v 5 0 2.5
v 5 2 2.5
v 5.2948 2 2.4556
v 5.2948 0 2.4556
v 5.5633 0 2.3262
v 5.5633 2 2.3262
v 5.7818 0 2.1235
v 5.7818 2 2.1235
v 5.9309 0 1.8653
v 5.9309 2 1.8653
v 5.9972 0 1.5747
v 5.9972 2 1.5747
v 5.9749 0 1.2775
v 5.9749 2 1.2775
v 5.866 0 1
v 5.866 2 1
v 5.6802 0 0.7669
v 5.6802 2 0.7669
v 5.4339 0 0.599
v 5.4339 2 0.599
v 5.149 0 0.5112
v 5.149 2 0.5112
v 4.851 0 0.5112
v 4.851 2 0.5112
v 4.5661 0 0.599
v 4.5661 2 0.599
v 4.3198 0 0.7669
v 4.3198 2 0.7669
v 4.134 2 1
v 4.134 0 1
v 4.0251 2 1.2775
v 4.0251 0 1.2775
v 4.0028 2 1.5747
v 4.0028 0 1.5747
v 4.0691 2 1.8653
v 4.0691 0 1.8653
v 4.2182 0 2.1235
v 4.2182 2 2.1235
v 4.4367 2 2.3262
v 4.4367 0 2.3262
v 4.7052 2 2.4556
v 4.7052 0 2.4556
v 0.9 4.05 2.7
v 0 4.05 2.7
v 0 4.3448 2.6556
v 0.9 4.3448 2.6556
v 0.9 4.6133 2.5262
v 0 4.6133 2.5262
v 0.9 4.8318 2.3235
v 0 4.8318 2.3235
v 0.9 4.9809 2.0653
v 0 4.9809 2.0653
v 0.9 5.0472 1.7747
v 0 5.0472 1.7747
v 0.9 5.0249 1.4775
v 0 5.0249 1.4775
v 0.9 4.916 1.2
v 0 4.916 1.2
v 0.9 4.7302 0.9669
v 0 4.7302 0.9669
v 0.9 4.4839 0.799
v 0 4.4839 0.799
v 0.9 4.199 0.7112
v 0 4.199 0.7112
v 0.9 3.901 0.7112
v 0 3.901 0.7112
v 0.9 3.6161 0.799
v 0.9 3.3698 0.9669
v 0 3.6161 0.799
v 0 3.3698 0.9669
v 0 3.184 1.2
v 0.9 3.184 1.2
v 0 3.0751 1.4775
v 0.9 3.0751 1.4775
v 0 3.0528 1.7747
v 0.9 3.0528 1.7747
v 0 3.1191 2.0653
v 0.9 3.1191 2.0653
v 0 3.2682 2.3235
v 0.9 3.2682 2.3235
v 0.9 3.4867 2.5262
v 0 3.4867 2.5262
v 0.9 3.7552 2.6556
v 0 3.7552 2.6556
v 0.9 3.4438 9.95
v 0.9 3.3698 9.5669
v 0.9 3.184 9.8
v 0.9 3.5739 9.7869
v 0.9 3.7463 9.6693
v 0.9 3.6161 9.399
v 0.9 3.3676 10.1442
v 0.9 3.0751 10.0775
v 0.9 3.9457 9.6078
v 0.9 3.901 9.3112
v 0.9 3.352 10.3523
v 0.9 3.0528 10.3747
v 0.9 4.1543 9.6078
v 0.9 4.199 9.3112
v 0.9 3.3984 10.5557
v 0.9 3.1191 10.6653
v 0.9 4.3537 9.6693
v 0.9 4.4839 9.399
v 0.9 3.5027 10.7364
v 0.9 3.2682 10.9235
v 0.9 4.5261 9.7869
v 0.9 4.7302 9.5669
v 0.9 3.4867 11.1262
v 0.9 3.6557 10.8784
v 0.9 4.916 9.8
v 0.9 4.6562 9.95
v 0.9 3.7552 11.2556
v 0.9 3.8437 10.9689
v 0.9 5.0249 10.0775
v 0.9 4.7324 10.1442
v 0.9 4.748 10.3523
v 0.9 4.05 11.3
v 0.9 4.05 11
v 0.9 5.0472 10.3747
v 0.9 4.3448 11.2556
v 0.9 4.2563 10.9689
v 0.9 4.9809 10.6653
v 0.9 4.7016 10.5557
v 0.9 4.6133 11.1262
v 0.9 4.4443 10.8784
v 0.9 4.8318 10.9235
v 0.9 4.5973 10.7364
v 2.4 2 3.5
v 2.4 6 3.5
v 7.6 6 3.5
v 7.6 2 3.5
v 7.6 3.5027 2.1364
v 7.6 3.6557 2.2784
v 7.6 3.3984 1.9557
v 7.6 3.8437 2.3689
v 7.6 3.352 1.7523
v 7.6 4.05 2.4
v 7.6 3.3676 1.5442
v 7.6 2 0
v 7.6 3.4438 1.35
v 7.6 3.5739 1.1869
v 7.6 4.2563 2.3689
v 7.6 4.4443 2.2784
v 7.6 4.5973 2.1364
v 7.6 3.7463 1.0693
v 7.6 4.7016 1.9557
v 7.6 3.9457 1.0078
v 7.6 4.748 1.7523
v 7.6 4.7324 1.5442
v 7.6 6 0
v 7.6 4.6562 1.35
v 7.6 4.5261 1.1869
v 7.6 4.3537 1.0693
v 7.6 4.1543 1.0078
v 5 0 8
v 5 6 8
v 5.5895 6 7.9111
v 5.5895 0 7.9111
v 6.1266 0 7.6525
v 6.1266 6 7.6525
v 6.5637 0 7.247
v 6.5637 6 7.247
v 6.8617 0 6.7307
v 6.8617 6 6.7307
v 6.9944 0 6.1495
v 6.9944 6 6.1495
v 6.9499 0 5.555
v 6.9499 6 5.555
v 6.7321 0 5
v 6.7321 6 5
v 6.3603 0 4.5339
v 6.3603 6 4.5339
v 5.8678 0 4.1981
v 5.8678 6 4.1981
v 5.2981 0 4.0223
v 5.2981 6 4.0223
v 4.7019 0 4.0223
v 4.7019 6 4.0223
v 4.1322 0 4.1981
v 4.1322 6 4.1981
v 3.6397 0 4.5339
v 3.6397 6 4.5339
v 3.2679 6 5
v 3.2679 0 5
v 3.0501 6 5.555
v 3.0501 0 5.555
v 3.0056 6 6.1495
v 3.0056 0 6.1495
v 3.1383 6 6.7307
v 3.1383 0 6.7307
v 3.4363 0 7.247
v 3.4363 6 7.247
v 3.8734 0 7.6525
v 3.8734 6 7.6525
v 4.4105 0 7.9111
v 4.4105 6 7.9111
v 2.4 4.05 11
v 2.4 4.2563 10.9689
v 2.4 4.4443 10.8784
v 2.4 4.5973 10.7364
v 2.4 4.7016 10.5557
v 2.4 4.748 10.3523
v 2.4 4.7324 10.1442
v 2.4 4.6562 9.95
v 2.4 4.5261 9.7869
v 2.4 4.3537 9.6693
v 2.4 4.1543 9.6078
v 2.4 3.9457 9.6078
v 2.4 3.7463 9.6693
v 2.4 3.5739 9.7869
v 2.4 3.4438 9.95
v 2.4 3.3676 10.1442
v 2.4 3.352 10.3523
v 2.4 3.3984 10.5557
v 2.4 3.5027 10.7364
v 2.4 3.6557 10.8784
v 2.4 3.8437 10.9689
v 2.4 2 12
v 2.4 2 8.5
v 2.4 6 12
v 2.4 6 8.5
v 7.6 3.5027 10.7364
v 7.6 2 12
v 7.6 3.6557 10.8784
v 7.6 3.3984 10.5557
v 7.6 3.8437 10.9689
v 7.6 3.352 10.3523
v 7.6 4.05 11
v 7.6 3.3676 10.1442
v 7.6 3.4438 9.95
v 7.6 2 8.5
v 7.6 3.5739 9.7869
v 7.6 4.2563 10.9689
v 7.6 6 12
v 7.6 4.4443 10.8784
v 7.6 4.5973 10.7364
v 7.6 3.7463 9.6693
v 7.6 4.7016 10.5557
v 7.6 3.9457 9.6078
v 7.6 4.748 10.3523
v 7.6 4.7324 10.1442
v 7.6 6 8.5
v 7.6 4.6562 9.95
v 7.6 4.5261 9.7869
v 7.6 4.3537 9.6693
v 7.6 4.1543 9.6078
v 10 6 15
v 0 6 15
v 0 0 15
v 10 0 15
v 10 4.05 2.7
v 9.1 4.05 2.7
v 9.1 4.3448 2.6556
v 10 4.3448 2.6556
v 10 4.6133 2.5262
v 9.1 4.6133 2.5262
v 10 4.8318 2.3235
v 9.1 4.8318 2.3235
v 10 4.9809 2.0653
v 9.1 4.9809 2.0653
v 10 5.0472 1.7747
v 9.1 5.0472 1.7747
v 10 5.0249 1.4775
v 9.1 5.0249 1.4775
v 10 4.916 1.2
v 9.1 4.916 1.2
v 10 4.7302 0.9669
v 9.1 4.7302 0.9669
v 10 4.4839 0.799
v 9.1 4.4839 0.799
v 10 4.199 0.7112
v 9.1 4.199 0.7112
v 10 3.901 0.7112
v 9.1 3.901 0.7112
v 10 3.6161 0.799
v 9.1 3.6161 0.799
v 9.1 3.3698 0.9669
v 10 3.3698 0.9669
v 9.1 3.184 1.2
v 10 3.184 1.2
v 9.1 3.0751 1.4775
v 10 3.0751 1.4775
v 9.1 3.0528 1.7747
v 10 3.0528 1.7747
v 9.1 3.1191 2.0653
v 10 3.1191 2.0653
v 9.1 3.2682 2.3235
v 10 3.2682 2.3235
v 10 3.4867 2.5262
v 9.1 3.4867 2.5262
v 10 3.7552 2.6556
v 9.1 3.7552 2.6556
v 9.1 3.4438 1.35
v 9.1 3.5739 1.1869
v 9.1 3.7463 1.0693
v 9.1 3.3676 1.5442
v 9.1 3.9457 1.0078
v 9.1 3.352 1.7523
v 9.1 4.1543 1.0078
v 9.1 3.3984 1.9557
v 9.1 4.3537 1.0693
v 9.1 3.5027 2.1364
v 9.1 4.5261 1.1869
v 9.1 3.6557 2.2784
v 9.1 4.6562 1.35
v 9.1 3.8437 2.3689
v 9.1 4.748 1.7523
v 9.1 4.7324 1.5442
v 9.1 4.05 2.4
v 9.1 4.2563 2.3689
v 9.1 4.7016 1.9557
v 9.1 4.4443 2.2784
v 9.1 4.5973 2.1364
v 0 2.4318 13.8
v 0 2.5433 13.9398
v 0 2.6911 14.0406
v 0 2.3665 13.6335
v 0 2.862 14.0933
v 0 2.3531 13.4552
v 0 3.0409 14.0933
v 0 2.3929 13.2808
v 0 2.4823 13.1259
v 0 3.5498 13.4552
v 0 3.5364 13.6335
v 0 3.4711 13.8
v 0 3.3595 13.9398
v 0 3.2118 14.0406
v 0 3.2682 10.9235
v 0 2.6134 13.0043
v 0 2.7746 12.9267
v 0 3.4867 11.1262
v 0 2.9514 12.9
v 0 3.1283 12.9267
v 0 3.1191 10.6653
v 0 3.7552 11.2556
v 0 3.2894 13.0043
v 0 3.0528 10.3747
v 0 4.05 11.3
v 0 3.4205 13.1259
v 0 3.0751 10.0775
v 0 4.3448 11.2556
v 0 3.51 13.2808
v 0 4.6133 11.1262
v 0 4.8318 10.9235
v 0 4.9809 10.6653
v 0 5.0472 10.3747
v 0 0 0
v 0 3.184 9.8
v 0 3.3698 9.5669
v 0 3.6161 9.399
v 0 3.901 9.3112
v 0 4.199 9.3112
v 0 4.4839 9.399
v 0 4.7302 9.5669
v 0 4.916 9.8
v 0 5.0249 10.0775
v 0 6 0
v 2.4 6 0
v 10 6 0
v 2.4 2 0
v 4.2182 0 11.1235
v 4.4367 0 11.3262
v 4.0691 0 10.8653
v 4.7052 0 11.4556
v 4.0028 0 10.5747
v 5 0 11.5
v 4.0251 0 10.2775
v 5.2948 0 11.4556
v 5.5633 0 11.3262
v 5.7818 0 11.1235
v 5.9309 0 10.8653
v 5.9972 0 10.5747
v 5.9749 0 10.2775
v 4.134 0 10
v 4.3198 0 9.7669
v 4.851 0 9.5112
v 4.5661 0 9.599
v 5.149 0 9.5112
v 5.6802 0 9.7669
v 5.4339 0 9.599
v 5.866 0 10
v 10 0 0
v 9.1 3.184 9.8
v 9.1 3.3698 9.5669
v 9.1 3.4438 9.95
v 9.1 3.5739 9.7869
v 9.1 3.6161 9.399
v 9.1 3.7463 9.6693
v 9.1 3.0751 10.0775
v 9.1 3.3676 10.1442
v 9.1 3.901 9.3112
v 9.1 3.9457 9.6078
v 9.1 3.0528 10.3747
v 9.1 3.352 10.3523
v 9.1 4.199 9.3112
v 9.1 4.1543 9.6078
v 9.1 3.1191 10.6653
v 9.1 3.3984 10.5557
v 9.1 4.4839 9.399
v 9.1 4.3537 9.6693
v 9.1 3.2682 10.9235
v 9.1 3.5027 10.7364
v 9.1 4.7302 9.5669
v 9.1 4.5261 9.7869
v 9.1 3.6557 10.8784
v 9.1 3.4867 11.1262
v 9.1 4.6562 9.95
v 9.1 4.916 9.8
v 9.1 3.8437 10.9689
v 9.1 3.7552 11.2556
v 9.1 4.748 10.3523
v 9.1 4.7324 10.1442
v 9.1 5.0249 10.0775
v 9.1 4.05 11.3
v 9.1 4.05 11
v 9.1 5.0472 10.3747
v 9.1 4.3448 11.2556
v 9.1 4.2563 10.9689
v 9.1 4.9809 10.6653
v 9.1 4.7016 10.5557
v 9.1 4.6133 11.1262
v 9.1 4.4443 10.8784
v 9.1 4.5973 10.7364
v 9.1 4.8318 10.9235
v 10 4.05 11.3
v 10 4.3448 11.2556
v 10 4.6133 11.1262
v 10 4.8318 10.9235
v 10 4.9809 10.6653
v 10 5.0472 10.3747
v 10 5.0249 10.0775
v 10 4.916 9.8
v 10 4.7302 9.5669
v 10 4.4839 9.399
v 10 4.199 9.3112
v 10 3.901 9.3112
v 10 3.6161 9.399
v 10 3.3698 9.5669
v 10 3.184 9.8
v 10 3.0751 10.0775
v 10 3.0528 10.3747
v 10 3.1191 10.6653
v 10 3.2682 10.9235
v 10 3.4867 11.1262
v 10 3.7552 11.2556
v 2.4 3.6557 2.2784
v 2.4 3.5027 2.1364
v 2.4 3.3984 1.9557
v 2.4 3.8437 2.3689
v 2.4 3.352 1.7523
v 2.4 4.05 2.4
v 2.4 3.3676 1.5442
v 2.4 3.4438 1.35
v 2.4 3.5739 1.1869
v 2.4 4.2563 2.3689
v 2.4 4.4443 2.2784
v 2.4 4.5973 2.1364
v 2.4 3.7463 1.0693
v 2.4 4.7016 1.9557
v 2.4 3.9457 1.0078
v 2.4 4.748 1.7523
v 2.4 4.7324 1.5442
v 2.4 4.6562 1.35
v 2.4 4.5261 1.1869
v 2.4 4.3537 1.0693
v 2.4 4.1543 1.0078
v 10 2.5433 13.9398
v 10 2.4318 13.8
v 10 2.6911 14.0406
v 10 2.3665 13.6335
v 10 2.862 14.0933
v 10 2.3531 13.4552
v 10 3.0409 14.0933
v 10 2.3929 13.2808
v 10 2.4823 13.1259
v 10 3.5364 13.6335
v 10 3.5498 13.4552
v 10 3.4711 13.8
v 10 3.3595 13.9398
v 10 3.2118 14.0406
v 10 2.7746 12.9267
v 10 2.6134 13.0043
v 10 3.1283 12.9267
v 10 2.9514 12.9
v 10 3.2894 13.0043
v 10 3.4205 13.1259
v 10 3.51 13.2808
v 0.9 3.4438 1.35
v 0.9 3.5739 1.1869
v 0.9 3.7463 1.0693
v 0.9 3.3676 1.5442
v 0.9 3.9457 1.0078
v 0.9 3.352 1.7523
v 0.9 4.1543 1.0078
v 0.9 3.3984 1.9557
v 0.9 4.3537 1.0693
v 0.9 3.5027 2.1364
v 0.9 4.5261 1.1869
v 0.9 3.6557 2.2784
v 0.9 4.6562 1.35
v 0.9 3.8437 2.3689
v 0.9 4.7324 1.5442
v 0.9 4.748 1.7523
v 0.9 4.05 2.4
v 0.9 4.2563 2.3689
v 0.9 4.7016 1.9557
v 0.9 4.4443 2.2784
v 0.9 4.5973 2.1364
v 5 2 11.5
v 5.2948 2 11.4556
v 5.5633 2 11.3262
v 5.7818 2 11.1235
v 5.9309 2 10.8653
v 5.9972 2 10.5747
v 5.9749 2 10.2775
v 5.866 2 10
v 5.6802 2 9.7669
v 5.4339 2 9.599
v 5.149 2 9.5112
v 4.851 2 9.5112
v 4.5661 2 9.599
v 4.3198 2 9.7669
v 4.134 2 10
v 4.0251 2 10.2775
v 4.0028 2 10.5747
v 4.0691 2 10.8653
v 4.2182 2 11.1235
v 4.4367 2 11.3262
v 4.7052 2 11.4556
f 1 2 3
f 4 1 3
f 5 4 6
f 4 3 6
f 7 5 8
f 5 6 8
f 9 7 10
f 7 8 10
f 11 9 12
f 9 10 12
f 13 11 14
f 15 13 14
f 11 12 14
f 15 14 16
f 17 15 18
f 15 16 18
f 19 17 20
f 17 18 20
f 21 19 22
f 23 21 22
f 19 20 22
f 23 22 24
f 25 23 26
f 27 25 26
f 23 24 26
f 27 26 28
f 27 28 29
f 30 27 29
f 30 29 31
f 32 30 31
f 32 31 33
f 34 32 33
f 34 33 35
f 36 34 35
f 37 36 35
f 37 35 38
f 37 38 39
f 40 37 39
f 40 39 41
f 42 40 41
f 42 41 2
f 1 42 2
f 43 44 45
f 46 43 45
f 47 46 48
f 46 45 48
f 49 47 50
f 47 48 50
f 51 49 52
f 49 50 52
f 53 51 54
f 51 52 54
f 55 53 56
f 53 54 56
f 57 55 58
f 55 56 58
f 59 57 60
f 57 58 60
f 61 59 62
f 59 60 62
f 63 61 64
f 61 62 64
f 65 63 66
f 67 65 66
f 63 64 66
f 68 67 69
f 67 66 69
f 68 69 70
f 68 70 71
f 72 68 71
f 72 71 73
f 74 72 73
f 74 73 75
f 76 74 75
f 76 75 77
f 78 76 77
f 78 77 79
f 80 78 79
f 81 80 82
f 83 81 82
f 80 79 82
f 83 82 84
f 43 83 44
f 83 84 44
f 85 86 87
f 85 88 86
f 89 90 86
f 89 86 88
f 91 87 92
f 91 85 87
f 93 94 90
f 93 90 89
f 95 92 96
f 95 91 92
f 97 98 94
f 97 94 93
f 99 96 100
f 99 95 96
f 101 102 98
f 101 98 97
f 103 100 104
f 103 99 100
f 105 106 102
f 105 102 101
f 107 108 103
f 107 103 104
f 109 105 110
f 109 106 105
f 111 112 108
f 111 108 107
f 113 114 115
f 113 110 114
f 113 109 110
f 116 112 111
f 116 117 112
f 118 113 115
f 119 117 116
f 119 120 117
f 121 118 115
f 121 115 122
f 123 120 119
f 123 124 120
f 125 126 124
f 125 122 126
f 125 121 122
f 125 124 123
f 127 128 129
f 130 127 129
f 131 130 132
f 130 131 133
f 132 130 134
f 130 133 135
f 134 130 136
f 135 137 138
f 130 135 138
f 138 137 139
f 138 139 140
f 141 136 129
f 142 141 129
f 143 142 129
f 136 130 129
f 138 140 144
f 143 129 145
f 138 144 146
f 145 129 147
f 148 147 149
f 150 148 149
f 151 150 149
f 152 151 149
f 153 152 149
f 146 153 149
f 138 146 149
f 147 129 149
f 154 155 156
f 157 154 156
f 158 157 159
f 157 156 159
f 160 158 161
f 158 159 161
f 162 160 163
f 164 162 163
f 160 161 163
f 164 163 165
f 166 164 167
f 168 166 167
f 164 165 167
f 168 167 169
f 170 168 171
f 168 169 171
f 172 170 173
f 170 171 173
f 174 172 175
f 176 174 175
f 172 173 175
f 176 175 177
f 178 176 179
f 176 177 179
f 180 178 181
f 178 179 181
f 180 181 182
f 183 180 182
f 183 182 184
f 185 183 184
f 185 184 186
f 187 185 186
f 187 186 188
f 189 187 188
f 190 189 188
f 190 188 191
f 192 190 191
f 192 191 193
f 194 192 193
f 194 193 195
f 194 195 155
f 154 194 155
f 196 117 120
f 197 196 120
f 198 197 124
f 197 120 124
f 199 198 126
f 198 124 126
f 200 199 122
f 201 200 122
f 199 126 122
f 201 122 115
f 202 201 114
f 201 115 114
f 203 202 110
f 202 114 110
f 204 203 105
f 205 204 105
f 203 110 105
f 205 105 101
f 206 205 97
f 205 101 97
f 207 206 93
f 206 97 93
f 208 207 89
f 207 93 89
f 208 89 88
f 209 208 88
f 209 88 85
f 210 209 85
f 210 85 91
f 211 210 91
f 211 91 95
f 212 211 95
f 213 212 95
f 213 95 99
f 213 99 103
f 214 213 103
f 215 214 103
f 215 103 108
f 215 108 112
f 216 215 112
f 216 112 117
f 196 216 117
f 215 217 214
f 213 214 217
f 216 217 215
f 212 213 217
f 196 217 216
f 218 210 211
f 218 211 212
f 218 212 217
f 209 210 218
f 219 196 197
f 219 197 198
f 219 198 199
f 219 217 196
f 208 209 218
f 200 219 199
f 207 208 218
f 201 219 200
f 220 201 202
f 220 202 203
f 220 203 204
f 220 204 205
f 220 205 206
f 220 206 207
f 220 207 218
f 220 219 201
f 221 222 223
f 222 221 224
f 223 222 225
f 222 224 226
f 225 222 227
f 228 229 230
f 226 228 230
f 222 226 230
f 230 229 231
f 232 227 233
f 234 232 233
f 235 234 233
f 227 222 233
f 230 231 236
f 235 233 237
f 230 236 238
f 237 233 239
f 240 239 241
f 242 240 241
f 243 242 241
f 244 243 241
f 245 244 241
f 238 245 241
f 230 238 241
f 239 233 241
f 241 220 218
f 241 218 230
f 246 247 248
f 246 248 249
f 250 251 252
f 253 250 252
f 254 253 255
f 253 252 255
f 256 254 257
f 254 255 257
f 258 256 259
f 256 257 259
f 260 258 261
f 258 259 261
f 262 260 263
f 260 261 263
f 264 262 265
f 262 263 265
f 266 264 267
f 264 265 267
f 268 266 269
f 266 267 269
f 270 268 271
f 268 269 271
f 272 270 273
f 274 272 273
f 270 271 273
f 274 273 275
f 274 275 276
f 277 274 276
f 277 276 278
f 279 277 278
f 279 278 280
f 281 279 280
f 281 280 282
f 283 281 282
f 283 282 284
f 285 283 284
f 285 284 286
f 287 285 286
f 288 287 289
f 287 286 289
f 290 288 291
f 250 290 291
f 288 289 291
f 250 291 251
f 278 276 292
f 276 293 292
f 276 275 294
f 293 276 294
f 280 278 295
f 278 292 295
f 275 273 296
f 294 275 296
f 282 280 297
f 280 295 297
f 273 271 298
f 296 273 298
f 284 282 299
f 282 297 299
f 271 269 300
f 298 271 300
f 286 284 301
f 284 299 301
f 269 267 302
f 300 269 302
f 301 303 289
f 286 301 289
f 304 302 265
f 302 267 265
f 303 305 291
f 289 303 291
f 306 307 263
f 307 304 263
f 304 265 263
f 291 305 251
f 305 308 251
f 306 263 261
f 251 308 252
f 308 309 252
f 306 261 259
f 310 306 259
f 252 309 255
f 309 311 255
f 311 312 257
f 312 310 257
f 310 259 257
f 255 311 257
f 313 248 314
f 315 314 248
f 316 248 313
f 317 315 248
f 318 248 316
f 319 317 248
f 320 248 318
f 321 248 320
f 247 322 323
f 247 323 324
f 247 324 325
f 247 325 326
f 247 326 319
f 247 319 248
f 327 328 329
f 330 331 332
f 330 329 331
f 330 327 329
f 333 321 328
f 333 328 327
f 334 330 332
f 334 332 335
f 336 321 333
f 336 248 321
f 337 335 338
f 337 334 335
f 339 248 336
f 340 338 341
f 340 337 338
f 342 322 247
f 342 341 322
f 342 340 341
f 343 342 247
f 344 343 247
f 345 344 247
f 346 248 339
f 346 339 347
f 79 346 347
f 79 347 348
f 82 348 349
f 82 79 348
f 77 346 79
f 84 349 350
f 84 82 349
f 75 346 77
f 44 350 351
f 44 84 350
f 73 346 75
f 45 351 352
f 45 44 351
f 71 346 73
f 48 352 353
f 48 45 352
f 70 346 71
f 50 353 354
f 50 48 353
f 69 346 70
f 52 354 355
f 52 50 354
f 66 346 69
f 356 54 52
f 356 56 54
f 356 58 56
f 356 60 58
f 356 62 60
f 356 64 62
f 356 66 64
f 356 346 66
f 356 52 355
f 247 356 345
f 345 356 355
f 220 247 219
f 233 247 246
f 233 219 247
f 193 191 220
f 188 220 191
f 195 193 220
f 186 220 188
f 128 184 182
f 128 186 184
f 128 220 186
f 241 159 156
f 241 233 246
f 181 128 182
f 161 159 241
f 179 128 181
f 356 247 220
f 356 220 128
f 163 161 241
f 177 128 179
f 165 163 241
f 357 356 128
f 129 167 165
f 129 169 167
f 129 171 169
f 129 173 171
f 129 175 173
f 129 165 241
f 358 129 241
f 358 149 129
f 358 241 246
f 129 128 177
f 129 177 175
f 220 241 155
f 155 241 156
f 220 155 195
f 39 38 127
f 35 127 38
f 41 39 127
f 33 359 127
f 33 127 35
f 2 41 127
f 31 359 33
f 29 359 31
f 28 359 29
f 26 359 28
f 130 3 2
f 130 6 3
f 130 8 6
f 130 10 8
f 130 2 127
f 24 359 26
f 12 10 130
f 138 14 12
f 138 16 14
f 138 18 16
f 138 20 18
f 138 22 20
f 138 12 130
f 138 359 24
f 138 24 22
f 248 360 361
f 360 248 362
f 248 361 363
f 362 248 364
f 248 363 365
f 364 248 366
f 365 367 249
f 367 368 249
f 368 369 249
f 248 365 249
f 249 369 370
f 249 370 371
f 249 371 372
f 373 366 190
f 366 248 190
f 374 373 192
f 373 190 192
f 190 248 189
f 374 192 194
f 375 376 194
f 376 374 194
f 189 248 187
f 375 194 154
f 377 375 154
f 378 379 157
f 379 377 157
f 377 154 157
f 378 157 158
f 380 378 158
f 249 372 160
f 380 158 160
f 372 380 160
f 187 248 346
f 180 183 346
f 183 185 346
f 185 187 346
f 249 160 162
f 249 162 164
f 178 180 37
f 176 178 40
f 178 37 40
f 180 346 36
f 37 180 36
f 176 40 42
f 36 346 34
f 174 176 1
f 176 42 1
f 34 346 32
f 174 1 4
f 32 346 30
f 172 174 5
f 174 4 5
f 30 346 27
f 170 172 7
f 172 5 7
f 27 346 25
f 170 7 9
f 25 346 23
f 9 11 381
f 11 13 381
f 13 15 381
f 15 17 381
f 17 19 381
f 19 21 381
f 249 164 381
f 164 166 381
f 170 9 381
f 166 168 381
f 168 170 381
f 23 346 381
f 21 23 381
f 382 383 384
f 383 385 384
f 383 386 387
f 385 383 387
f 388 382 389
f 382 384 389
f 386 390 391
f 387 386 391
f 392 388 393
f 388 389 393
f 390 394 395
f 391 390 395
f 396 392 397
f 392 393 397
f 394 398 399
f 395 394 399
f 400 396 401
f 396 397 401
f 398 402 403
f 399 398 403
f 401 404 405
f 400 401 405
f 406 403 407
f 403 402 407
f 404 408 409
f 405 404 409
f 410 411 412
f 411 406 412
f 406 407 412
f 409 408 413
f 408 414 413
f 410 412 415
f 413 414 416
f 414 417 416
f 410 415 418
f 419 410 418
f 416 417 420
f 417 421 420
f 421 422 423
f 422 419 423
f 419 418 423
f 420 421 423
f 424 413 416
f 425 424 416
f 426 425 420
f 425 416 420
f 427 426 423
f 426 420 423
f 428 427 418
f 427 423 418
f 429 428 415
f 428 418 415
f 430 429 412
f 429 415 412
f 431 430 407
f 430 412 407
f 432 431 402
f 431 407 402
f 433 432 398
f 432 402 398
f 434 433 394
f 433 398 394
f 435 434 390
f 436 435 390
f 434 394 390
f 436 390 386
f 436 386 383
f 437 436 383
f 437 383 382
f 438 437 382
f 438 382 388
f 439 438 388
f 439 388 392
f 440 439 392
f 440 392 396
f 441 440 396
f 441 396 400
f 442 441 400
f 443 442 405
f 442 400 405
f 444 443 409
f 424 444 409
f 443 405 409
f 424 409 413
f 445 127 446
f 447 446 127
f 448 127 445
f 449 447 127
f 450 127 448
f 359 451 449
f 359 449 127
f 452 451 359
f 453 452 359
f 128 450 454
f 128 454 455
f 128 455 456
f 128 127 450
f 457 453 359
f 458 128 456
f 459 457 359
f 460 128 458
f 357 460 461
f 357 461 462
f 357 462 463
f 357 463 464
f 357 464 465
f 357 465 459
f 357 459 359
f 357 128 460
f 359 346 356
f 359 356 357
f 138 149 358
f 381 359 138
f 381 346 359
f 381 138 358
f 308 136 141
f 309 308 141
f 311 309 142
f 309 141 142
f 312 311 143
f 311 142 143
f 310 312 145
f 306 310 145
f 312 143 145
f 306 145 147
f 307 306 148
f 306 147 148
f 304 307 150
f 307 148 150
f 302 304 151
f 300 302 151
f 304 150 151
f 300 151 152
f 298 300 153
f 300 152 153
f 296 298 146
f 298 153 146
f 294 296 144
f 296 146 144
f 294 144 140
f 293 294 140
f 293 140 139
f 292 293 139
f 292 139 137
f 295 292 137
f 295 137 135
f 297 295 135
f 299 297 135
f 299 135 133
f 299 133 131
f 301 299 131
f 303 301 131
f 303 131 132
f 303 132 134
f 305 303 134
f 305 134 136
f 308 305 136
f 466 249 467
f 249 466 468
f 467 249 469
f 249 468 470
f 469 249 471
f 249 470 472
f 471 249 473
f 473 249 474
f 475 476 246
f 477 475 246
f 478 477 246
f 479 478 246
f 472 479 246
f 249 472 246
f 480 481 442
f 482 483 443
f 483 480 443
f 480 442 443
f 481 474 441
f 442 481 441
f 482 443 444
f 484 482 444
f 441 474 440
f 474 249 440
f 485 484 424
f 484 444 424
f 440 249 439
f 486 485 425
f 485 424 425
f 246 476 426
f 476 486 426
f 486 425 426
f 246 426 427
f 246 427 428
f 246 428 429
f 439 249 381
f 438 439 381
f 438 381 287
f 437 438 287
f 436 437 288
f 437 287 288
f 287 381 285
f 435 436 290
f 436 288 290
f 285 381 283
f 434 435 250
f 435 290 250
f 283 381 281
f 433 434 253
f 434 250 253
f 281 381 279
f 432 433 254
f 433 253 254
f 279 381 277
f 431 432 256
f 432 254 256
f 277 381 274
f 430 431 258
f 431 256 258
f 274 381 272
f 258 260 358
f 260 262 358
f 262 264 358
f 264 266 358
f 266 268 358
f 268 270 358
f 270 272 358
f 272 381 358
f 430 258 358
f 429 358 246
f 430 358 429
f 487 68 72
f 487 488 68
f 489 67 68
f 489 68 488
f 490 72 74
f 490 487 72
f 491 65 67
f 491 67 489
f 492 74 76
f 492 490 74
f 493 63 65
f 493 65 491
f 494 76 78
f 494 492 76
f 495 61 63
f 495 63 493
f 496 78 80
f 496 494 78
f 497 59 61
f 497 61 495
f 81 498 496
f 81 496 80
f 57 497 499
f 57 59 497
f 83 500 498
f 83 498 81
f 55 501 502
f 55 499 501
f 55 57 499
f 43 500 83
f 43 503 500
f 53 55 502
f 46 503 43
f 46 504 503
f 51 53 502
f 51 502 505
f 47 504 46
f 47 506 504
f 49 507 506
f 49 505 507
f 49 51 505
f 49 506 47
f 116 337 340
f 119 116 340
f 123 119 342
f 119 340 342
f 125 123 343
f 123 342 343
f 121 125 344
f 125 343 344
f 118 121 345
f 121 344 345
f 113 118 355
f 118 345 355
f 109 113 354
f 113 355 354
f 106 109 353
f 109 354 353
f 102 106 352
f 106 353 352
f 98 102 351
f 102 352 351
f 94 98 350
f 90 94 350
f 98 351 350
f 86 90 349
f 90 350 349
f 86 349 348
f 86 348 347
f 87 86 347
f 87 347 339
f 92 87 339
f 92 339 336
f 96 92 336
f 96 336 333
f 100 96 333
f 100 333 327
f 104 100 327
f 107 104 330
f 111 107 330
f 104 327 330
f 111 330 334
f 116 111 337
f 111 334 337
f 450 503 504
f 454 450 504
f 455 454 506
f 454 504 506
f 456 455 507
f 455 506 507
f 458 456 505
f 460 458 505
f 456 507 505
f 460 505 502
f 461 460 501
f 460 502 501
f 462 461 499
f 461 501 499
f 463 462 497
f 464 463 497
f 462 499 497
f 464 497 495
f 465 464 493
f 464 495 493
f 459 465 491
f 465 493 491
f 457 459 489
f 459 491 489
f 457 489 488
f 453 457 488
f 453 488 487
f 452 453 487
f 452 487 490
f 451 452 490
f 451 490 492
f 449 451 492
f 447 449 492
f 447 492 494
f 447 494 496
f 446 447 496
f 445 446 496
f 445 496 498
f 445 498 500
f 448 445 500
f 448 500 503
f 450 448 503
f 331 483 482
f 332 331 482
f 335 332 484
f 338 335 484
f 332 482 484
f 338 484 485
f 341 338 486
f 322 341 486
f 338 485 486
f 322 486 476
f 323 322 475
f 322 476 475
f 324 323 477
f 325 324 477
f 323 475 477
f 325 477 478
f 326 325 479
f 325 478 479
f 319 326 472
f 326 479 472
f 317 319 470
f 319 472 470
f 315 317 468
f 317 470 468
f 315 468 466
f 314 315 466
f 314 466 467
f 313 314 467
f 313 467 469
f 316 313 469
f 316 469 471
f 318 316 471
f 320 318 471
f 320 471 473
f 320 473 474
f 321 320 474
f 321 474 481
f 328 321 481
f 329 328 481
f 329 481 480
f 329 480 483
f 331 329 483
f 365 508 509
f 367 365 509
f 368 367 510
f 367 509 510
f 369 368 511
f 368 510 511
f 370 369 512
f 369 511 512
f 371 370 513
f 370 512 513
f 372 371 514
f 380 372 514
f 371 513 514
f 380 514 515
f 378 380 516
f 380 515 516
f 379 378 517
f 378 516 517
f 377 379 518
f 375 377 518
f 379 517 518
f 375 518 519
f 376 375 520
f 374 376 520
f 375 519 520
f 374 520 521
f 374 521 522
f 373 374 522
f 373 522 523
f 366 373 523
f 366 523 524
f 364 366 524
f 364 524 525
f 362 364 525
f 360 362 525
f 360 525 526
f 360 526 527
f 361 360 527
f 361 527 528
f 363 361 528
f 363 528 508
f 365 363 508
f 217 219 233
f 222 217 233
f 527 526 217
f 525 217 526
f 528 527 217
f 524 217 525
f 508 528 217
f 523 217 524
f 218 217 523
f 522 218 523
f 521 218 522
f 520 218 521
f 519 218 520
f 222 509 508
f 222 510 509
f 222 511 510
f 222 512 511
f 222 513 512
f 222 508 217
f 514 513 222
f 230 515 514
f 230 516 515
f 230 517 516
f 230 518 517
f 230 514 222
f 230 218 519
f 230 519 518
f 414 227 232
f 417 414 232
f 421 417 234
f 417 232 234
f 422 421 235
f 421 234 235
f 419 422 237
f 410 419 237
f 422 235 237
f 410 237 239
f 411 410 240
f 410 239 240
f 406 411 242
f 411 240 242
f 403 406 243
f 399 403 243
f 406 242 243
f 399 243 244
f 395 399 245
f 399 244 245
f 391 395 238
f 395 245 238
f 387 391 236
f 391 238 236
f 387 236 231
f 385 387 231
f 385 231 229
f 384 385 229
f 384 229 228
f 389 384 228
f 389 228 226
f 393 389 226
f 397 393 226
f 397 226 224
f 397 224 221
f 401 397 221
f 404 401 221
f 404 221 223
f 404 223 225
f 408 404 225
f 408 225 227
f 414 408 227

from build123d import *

# Parameters (mm, degrees)
SKETCH_1_W          = 10
SKETCH_1_H          = 12
EXTRUDE_1_DEPTH     = 6
SKETCH_2_R          = 1
CUT_EXTRUDE_1_DEPTH = 17.733200531
SKETCH_2_3_R        = 2
CUT_EXTRUDE_2_DEPTH = 4
SKETCH_3_R          = 2
CUT_EXTRUDE_3_DEPTH = 17.733200531
SKETCH_4_W          = 5.2
SKETCH_4_H          = 3.5
CUT_EXTRUDE_4_DEPTH = 4
SKETCH_6_R          = 0.7
CUT_EXTRUDE_5_DEPTH = 17.733200531
SKETCH_6_3_R        = 1
CUT_EXTRUDE_6_DEPTH = 0.9
CUT_EXTRUDE_START   = -9.1
SKETCH_6_4_R        = 1
CUT_EXTRUDE_7_DEPTH = 0.9
SKETCH_7_W          = 10
SKETCH_7_H          = 6
EXTRUDE_3_DEPTH     = 3
SKETCH_8_R          = 0.6
CUT_EXTRUDE_8_DEPTH = 20


with BuildPart() as part:
    # 草图1 → 凸台-拉伸1 (new body)
    with BuildSketch(Plane(origin=(0, 0, 0), x_dir=(1, 0, 0), z_dir=(0, 1, 0))):
        with Locations((5, -6)):
            Rectangle(SKETCH_1_W, SKETCH_1_H)
    extrude(amount=EXTRUDE_1_DEPTH)

    # 草图2 → 切除-拉伸1 (cut, through all)
    with BuildSketch(Plane(origin=(0, 6, 0), x_dir=(1, 0, 0), z_dir=(0, 1, 0))):
        with Locations(Location((5, -1.5, 0), (0, 0, 270))):
            Circle(SKETCH_2_R)
        with Locations(Location((5, -10.5, 0), (0, 0, 270))):
            Circle(SKETCH_2_R)
    extrude(amount=-CUT_EXTRUDE_1_DEPTH, mode=Mode.SUBTRACT)

    # 草图2<3> → 切除-拉伸2 (cut)
    with BuildSketch(Plane(origin=(0, 6, 0), x_dir=(1, 0, 0), z_dir=(0, 1, 0))):
        with Locations((5, -1.5)):
            Circle(SKETCH_2_3_R)
        with Locations((5, -10.5)):
            Circle(SKETCH_2_3_R)
    extrude(amount=-CUT_EXTRUDE_2_DEPTH, mode=Mode.SUBTRACT)

    # 草图3 → 切除-拉伸3 (cut, through all)
    with BuildSketch(Plane(origin=(0, 6, 0), x_dir=(1, 0, 0), z_dir=(0, 1, 0))):
        with Locations(Location((5, -6, 0), (0, 0, 270))):
            Circle(SKETCH_3_R)
    extrude(amount=-CUT_EXTRUDE_3_DEPTH, mode=Mode.SUBTRACT)

    # 草图4 → 切除-拉伸4 (cut)
    with BuildSketch(Plane(origin=(0, 6, 0), x_dir=(1, 0, 0), z_dir=(0, 1, 0))):
        with Locations((5, -1.75)):
            Rectangle(SKETCH_4_W, SKETCH_4_H)
        with Locations((5, -10.25)):
            Rectangle(SKETCH_4_W, SKETCH_4_H)
    extrude(amount=-CUT_EXTRUDE_4_DEPTH, mode=Mode.SUBTRACT)

    # 草图6 → 切除-拉伸5 (cut, through all)
    with BuildSketch(Plane.ZY):
        with Locations((1.7, 4.05)):
            Circle(SKETCH_6_R)
        with Locations((10.3, 4.05)):
            Circle(SKETCH_6_R)
    extrude(amount=-CUT_EXTRUDE_5_DEPTH, mode=Mode.SUBTRACT)

    # 草图6<3> → 切除-拉伸6 (cut)
    with BuildSketch(Plane.ZY):
        with Locations((1.7, 4.05)):
            Circle(SKETCH_6_3_R)
        with Locations((10.3, 4.05)):
            Circle(SKETCH_6_3_R)
    extrude(amount=-CUT_EXTRUDE_6_DEPTH, mode=Mode.SUBTRACT)

    # 草图6<4> → 切除-拉伸7 (cut)
    with BuildSketch(Plane.ZY.offset(CUT_EXTRUDE_START)):
        with Locations((1.7, 4.05)):
            Circle(SKETCH_6_4_R)
        with Locations((10.3, 4.05)):
            Circle(SKETCH_6_4_R)
    extrude(amount=-CUT_EXTRUDE_7_DEPTH, mode=Mode.SUBTRACT)

    # 草图7 → 凸台-拉伸3 (add)
    with BuildSketch(Plane.XY.offset(12)):
        with Locations((5, 3)):
            Rectangle(SKETCH_7_W, SKETCH_7_H)
    extrude(amount=EXTRUDE_3_DEPTH)

    # 草图8 → 切除-拉伸8 (cut, through all)
    with BuildSketch(Plane(origin=(10, 0, 0), x_dir=(0, 0, -1), z_dir=(1, 0, 0))):
        with Locations((-13.5, 2.951438323)):
            Circle(SKETCH_8_R)
    extrude(amount=-CUT_EXTRUDE_8_DEPTH, mode=Mode.SUBTRACT)


solid = part.part
